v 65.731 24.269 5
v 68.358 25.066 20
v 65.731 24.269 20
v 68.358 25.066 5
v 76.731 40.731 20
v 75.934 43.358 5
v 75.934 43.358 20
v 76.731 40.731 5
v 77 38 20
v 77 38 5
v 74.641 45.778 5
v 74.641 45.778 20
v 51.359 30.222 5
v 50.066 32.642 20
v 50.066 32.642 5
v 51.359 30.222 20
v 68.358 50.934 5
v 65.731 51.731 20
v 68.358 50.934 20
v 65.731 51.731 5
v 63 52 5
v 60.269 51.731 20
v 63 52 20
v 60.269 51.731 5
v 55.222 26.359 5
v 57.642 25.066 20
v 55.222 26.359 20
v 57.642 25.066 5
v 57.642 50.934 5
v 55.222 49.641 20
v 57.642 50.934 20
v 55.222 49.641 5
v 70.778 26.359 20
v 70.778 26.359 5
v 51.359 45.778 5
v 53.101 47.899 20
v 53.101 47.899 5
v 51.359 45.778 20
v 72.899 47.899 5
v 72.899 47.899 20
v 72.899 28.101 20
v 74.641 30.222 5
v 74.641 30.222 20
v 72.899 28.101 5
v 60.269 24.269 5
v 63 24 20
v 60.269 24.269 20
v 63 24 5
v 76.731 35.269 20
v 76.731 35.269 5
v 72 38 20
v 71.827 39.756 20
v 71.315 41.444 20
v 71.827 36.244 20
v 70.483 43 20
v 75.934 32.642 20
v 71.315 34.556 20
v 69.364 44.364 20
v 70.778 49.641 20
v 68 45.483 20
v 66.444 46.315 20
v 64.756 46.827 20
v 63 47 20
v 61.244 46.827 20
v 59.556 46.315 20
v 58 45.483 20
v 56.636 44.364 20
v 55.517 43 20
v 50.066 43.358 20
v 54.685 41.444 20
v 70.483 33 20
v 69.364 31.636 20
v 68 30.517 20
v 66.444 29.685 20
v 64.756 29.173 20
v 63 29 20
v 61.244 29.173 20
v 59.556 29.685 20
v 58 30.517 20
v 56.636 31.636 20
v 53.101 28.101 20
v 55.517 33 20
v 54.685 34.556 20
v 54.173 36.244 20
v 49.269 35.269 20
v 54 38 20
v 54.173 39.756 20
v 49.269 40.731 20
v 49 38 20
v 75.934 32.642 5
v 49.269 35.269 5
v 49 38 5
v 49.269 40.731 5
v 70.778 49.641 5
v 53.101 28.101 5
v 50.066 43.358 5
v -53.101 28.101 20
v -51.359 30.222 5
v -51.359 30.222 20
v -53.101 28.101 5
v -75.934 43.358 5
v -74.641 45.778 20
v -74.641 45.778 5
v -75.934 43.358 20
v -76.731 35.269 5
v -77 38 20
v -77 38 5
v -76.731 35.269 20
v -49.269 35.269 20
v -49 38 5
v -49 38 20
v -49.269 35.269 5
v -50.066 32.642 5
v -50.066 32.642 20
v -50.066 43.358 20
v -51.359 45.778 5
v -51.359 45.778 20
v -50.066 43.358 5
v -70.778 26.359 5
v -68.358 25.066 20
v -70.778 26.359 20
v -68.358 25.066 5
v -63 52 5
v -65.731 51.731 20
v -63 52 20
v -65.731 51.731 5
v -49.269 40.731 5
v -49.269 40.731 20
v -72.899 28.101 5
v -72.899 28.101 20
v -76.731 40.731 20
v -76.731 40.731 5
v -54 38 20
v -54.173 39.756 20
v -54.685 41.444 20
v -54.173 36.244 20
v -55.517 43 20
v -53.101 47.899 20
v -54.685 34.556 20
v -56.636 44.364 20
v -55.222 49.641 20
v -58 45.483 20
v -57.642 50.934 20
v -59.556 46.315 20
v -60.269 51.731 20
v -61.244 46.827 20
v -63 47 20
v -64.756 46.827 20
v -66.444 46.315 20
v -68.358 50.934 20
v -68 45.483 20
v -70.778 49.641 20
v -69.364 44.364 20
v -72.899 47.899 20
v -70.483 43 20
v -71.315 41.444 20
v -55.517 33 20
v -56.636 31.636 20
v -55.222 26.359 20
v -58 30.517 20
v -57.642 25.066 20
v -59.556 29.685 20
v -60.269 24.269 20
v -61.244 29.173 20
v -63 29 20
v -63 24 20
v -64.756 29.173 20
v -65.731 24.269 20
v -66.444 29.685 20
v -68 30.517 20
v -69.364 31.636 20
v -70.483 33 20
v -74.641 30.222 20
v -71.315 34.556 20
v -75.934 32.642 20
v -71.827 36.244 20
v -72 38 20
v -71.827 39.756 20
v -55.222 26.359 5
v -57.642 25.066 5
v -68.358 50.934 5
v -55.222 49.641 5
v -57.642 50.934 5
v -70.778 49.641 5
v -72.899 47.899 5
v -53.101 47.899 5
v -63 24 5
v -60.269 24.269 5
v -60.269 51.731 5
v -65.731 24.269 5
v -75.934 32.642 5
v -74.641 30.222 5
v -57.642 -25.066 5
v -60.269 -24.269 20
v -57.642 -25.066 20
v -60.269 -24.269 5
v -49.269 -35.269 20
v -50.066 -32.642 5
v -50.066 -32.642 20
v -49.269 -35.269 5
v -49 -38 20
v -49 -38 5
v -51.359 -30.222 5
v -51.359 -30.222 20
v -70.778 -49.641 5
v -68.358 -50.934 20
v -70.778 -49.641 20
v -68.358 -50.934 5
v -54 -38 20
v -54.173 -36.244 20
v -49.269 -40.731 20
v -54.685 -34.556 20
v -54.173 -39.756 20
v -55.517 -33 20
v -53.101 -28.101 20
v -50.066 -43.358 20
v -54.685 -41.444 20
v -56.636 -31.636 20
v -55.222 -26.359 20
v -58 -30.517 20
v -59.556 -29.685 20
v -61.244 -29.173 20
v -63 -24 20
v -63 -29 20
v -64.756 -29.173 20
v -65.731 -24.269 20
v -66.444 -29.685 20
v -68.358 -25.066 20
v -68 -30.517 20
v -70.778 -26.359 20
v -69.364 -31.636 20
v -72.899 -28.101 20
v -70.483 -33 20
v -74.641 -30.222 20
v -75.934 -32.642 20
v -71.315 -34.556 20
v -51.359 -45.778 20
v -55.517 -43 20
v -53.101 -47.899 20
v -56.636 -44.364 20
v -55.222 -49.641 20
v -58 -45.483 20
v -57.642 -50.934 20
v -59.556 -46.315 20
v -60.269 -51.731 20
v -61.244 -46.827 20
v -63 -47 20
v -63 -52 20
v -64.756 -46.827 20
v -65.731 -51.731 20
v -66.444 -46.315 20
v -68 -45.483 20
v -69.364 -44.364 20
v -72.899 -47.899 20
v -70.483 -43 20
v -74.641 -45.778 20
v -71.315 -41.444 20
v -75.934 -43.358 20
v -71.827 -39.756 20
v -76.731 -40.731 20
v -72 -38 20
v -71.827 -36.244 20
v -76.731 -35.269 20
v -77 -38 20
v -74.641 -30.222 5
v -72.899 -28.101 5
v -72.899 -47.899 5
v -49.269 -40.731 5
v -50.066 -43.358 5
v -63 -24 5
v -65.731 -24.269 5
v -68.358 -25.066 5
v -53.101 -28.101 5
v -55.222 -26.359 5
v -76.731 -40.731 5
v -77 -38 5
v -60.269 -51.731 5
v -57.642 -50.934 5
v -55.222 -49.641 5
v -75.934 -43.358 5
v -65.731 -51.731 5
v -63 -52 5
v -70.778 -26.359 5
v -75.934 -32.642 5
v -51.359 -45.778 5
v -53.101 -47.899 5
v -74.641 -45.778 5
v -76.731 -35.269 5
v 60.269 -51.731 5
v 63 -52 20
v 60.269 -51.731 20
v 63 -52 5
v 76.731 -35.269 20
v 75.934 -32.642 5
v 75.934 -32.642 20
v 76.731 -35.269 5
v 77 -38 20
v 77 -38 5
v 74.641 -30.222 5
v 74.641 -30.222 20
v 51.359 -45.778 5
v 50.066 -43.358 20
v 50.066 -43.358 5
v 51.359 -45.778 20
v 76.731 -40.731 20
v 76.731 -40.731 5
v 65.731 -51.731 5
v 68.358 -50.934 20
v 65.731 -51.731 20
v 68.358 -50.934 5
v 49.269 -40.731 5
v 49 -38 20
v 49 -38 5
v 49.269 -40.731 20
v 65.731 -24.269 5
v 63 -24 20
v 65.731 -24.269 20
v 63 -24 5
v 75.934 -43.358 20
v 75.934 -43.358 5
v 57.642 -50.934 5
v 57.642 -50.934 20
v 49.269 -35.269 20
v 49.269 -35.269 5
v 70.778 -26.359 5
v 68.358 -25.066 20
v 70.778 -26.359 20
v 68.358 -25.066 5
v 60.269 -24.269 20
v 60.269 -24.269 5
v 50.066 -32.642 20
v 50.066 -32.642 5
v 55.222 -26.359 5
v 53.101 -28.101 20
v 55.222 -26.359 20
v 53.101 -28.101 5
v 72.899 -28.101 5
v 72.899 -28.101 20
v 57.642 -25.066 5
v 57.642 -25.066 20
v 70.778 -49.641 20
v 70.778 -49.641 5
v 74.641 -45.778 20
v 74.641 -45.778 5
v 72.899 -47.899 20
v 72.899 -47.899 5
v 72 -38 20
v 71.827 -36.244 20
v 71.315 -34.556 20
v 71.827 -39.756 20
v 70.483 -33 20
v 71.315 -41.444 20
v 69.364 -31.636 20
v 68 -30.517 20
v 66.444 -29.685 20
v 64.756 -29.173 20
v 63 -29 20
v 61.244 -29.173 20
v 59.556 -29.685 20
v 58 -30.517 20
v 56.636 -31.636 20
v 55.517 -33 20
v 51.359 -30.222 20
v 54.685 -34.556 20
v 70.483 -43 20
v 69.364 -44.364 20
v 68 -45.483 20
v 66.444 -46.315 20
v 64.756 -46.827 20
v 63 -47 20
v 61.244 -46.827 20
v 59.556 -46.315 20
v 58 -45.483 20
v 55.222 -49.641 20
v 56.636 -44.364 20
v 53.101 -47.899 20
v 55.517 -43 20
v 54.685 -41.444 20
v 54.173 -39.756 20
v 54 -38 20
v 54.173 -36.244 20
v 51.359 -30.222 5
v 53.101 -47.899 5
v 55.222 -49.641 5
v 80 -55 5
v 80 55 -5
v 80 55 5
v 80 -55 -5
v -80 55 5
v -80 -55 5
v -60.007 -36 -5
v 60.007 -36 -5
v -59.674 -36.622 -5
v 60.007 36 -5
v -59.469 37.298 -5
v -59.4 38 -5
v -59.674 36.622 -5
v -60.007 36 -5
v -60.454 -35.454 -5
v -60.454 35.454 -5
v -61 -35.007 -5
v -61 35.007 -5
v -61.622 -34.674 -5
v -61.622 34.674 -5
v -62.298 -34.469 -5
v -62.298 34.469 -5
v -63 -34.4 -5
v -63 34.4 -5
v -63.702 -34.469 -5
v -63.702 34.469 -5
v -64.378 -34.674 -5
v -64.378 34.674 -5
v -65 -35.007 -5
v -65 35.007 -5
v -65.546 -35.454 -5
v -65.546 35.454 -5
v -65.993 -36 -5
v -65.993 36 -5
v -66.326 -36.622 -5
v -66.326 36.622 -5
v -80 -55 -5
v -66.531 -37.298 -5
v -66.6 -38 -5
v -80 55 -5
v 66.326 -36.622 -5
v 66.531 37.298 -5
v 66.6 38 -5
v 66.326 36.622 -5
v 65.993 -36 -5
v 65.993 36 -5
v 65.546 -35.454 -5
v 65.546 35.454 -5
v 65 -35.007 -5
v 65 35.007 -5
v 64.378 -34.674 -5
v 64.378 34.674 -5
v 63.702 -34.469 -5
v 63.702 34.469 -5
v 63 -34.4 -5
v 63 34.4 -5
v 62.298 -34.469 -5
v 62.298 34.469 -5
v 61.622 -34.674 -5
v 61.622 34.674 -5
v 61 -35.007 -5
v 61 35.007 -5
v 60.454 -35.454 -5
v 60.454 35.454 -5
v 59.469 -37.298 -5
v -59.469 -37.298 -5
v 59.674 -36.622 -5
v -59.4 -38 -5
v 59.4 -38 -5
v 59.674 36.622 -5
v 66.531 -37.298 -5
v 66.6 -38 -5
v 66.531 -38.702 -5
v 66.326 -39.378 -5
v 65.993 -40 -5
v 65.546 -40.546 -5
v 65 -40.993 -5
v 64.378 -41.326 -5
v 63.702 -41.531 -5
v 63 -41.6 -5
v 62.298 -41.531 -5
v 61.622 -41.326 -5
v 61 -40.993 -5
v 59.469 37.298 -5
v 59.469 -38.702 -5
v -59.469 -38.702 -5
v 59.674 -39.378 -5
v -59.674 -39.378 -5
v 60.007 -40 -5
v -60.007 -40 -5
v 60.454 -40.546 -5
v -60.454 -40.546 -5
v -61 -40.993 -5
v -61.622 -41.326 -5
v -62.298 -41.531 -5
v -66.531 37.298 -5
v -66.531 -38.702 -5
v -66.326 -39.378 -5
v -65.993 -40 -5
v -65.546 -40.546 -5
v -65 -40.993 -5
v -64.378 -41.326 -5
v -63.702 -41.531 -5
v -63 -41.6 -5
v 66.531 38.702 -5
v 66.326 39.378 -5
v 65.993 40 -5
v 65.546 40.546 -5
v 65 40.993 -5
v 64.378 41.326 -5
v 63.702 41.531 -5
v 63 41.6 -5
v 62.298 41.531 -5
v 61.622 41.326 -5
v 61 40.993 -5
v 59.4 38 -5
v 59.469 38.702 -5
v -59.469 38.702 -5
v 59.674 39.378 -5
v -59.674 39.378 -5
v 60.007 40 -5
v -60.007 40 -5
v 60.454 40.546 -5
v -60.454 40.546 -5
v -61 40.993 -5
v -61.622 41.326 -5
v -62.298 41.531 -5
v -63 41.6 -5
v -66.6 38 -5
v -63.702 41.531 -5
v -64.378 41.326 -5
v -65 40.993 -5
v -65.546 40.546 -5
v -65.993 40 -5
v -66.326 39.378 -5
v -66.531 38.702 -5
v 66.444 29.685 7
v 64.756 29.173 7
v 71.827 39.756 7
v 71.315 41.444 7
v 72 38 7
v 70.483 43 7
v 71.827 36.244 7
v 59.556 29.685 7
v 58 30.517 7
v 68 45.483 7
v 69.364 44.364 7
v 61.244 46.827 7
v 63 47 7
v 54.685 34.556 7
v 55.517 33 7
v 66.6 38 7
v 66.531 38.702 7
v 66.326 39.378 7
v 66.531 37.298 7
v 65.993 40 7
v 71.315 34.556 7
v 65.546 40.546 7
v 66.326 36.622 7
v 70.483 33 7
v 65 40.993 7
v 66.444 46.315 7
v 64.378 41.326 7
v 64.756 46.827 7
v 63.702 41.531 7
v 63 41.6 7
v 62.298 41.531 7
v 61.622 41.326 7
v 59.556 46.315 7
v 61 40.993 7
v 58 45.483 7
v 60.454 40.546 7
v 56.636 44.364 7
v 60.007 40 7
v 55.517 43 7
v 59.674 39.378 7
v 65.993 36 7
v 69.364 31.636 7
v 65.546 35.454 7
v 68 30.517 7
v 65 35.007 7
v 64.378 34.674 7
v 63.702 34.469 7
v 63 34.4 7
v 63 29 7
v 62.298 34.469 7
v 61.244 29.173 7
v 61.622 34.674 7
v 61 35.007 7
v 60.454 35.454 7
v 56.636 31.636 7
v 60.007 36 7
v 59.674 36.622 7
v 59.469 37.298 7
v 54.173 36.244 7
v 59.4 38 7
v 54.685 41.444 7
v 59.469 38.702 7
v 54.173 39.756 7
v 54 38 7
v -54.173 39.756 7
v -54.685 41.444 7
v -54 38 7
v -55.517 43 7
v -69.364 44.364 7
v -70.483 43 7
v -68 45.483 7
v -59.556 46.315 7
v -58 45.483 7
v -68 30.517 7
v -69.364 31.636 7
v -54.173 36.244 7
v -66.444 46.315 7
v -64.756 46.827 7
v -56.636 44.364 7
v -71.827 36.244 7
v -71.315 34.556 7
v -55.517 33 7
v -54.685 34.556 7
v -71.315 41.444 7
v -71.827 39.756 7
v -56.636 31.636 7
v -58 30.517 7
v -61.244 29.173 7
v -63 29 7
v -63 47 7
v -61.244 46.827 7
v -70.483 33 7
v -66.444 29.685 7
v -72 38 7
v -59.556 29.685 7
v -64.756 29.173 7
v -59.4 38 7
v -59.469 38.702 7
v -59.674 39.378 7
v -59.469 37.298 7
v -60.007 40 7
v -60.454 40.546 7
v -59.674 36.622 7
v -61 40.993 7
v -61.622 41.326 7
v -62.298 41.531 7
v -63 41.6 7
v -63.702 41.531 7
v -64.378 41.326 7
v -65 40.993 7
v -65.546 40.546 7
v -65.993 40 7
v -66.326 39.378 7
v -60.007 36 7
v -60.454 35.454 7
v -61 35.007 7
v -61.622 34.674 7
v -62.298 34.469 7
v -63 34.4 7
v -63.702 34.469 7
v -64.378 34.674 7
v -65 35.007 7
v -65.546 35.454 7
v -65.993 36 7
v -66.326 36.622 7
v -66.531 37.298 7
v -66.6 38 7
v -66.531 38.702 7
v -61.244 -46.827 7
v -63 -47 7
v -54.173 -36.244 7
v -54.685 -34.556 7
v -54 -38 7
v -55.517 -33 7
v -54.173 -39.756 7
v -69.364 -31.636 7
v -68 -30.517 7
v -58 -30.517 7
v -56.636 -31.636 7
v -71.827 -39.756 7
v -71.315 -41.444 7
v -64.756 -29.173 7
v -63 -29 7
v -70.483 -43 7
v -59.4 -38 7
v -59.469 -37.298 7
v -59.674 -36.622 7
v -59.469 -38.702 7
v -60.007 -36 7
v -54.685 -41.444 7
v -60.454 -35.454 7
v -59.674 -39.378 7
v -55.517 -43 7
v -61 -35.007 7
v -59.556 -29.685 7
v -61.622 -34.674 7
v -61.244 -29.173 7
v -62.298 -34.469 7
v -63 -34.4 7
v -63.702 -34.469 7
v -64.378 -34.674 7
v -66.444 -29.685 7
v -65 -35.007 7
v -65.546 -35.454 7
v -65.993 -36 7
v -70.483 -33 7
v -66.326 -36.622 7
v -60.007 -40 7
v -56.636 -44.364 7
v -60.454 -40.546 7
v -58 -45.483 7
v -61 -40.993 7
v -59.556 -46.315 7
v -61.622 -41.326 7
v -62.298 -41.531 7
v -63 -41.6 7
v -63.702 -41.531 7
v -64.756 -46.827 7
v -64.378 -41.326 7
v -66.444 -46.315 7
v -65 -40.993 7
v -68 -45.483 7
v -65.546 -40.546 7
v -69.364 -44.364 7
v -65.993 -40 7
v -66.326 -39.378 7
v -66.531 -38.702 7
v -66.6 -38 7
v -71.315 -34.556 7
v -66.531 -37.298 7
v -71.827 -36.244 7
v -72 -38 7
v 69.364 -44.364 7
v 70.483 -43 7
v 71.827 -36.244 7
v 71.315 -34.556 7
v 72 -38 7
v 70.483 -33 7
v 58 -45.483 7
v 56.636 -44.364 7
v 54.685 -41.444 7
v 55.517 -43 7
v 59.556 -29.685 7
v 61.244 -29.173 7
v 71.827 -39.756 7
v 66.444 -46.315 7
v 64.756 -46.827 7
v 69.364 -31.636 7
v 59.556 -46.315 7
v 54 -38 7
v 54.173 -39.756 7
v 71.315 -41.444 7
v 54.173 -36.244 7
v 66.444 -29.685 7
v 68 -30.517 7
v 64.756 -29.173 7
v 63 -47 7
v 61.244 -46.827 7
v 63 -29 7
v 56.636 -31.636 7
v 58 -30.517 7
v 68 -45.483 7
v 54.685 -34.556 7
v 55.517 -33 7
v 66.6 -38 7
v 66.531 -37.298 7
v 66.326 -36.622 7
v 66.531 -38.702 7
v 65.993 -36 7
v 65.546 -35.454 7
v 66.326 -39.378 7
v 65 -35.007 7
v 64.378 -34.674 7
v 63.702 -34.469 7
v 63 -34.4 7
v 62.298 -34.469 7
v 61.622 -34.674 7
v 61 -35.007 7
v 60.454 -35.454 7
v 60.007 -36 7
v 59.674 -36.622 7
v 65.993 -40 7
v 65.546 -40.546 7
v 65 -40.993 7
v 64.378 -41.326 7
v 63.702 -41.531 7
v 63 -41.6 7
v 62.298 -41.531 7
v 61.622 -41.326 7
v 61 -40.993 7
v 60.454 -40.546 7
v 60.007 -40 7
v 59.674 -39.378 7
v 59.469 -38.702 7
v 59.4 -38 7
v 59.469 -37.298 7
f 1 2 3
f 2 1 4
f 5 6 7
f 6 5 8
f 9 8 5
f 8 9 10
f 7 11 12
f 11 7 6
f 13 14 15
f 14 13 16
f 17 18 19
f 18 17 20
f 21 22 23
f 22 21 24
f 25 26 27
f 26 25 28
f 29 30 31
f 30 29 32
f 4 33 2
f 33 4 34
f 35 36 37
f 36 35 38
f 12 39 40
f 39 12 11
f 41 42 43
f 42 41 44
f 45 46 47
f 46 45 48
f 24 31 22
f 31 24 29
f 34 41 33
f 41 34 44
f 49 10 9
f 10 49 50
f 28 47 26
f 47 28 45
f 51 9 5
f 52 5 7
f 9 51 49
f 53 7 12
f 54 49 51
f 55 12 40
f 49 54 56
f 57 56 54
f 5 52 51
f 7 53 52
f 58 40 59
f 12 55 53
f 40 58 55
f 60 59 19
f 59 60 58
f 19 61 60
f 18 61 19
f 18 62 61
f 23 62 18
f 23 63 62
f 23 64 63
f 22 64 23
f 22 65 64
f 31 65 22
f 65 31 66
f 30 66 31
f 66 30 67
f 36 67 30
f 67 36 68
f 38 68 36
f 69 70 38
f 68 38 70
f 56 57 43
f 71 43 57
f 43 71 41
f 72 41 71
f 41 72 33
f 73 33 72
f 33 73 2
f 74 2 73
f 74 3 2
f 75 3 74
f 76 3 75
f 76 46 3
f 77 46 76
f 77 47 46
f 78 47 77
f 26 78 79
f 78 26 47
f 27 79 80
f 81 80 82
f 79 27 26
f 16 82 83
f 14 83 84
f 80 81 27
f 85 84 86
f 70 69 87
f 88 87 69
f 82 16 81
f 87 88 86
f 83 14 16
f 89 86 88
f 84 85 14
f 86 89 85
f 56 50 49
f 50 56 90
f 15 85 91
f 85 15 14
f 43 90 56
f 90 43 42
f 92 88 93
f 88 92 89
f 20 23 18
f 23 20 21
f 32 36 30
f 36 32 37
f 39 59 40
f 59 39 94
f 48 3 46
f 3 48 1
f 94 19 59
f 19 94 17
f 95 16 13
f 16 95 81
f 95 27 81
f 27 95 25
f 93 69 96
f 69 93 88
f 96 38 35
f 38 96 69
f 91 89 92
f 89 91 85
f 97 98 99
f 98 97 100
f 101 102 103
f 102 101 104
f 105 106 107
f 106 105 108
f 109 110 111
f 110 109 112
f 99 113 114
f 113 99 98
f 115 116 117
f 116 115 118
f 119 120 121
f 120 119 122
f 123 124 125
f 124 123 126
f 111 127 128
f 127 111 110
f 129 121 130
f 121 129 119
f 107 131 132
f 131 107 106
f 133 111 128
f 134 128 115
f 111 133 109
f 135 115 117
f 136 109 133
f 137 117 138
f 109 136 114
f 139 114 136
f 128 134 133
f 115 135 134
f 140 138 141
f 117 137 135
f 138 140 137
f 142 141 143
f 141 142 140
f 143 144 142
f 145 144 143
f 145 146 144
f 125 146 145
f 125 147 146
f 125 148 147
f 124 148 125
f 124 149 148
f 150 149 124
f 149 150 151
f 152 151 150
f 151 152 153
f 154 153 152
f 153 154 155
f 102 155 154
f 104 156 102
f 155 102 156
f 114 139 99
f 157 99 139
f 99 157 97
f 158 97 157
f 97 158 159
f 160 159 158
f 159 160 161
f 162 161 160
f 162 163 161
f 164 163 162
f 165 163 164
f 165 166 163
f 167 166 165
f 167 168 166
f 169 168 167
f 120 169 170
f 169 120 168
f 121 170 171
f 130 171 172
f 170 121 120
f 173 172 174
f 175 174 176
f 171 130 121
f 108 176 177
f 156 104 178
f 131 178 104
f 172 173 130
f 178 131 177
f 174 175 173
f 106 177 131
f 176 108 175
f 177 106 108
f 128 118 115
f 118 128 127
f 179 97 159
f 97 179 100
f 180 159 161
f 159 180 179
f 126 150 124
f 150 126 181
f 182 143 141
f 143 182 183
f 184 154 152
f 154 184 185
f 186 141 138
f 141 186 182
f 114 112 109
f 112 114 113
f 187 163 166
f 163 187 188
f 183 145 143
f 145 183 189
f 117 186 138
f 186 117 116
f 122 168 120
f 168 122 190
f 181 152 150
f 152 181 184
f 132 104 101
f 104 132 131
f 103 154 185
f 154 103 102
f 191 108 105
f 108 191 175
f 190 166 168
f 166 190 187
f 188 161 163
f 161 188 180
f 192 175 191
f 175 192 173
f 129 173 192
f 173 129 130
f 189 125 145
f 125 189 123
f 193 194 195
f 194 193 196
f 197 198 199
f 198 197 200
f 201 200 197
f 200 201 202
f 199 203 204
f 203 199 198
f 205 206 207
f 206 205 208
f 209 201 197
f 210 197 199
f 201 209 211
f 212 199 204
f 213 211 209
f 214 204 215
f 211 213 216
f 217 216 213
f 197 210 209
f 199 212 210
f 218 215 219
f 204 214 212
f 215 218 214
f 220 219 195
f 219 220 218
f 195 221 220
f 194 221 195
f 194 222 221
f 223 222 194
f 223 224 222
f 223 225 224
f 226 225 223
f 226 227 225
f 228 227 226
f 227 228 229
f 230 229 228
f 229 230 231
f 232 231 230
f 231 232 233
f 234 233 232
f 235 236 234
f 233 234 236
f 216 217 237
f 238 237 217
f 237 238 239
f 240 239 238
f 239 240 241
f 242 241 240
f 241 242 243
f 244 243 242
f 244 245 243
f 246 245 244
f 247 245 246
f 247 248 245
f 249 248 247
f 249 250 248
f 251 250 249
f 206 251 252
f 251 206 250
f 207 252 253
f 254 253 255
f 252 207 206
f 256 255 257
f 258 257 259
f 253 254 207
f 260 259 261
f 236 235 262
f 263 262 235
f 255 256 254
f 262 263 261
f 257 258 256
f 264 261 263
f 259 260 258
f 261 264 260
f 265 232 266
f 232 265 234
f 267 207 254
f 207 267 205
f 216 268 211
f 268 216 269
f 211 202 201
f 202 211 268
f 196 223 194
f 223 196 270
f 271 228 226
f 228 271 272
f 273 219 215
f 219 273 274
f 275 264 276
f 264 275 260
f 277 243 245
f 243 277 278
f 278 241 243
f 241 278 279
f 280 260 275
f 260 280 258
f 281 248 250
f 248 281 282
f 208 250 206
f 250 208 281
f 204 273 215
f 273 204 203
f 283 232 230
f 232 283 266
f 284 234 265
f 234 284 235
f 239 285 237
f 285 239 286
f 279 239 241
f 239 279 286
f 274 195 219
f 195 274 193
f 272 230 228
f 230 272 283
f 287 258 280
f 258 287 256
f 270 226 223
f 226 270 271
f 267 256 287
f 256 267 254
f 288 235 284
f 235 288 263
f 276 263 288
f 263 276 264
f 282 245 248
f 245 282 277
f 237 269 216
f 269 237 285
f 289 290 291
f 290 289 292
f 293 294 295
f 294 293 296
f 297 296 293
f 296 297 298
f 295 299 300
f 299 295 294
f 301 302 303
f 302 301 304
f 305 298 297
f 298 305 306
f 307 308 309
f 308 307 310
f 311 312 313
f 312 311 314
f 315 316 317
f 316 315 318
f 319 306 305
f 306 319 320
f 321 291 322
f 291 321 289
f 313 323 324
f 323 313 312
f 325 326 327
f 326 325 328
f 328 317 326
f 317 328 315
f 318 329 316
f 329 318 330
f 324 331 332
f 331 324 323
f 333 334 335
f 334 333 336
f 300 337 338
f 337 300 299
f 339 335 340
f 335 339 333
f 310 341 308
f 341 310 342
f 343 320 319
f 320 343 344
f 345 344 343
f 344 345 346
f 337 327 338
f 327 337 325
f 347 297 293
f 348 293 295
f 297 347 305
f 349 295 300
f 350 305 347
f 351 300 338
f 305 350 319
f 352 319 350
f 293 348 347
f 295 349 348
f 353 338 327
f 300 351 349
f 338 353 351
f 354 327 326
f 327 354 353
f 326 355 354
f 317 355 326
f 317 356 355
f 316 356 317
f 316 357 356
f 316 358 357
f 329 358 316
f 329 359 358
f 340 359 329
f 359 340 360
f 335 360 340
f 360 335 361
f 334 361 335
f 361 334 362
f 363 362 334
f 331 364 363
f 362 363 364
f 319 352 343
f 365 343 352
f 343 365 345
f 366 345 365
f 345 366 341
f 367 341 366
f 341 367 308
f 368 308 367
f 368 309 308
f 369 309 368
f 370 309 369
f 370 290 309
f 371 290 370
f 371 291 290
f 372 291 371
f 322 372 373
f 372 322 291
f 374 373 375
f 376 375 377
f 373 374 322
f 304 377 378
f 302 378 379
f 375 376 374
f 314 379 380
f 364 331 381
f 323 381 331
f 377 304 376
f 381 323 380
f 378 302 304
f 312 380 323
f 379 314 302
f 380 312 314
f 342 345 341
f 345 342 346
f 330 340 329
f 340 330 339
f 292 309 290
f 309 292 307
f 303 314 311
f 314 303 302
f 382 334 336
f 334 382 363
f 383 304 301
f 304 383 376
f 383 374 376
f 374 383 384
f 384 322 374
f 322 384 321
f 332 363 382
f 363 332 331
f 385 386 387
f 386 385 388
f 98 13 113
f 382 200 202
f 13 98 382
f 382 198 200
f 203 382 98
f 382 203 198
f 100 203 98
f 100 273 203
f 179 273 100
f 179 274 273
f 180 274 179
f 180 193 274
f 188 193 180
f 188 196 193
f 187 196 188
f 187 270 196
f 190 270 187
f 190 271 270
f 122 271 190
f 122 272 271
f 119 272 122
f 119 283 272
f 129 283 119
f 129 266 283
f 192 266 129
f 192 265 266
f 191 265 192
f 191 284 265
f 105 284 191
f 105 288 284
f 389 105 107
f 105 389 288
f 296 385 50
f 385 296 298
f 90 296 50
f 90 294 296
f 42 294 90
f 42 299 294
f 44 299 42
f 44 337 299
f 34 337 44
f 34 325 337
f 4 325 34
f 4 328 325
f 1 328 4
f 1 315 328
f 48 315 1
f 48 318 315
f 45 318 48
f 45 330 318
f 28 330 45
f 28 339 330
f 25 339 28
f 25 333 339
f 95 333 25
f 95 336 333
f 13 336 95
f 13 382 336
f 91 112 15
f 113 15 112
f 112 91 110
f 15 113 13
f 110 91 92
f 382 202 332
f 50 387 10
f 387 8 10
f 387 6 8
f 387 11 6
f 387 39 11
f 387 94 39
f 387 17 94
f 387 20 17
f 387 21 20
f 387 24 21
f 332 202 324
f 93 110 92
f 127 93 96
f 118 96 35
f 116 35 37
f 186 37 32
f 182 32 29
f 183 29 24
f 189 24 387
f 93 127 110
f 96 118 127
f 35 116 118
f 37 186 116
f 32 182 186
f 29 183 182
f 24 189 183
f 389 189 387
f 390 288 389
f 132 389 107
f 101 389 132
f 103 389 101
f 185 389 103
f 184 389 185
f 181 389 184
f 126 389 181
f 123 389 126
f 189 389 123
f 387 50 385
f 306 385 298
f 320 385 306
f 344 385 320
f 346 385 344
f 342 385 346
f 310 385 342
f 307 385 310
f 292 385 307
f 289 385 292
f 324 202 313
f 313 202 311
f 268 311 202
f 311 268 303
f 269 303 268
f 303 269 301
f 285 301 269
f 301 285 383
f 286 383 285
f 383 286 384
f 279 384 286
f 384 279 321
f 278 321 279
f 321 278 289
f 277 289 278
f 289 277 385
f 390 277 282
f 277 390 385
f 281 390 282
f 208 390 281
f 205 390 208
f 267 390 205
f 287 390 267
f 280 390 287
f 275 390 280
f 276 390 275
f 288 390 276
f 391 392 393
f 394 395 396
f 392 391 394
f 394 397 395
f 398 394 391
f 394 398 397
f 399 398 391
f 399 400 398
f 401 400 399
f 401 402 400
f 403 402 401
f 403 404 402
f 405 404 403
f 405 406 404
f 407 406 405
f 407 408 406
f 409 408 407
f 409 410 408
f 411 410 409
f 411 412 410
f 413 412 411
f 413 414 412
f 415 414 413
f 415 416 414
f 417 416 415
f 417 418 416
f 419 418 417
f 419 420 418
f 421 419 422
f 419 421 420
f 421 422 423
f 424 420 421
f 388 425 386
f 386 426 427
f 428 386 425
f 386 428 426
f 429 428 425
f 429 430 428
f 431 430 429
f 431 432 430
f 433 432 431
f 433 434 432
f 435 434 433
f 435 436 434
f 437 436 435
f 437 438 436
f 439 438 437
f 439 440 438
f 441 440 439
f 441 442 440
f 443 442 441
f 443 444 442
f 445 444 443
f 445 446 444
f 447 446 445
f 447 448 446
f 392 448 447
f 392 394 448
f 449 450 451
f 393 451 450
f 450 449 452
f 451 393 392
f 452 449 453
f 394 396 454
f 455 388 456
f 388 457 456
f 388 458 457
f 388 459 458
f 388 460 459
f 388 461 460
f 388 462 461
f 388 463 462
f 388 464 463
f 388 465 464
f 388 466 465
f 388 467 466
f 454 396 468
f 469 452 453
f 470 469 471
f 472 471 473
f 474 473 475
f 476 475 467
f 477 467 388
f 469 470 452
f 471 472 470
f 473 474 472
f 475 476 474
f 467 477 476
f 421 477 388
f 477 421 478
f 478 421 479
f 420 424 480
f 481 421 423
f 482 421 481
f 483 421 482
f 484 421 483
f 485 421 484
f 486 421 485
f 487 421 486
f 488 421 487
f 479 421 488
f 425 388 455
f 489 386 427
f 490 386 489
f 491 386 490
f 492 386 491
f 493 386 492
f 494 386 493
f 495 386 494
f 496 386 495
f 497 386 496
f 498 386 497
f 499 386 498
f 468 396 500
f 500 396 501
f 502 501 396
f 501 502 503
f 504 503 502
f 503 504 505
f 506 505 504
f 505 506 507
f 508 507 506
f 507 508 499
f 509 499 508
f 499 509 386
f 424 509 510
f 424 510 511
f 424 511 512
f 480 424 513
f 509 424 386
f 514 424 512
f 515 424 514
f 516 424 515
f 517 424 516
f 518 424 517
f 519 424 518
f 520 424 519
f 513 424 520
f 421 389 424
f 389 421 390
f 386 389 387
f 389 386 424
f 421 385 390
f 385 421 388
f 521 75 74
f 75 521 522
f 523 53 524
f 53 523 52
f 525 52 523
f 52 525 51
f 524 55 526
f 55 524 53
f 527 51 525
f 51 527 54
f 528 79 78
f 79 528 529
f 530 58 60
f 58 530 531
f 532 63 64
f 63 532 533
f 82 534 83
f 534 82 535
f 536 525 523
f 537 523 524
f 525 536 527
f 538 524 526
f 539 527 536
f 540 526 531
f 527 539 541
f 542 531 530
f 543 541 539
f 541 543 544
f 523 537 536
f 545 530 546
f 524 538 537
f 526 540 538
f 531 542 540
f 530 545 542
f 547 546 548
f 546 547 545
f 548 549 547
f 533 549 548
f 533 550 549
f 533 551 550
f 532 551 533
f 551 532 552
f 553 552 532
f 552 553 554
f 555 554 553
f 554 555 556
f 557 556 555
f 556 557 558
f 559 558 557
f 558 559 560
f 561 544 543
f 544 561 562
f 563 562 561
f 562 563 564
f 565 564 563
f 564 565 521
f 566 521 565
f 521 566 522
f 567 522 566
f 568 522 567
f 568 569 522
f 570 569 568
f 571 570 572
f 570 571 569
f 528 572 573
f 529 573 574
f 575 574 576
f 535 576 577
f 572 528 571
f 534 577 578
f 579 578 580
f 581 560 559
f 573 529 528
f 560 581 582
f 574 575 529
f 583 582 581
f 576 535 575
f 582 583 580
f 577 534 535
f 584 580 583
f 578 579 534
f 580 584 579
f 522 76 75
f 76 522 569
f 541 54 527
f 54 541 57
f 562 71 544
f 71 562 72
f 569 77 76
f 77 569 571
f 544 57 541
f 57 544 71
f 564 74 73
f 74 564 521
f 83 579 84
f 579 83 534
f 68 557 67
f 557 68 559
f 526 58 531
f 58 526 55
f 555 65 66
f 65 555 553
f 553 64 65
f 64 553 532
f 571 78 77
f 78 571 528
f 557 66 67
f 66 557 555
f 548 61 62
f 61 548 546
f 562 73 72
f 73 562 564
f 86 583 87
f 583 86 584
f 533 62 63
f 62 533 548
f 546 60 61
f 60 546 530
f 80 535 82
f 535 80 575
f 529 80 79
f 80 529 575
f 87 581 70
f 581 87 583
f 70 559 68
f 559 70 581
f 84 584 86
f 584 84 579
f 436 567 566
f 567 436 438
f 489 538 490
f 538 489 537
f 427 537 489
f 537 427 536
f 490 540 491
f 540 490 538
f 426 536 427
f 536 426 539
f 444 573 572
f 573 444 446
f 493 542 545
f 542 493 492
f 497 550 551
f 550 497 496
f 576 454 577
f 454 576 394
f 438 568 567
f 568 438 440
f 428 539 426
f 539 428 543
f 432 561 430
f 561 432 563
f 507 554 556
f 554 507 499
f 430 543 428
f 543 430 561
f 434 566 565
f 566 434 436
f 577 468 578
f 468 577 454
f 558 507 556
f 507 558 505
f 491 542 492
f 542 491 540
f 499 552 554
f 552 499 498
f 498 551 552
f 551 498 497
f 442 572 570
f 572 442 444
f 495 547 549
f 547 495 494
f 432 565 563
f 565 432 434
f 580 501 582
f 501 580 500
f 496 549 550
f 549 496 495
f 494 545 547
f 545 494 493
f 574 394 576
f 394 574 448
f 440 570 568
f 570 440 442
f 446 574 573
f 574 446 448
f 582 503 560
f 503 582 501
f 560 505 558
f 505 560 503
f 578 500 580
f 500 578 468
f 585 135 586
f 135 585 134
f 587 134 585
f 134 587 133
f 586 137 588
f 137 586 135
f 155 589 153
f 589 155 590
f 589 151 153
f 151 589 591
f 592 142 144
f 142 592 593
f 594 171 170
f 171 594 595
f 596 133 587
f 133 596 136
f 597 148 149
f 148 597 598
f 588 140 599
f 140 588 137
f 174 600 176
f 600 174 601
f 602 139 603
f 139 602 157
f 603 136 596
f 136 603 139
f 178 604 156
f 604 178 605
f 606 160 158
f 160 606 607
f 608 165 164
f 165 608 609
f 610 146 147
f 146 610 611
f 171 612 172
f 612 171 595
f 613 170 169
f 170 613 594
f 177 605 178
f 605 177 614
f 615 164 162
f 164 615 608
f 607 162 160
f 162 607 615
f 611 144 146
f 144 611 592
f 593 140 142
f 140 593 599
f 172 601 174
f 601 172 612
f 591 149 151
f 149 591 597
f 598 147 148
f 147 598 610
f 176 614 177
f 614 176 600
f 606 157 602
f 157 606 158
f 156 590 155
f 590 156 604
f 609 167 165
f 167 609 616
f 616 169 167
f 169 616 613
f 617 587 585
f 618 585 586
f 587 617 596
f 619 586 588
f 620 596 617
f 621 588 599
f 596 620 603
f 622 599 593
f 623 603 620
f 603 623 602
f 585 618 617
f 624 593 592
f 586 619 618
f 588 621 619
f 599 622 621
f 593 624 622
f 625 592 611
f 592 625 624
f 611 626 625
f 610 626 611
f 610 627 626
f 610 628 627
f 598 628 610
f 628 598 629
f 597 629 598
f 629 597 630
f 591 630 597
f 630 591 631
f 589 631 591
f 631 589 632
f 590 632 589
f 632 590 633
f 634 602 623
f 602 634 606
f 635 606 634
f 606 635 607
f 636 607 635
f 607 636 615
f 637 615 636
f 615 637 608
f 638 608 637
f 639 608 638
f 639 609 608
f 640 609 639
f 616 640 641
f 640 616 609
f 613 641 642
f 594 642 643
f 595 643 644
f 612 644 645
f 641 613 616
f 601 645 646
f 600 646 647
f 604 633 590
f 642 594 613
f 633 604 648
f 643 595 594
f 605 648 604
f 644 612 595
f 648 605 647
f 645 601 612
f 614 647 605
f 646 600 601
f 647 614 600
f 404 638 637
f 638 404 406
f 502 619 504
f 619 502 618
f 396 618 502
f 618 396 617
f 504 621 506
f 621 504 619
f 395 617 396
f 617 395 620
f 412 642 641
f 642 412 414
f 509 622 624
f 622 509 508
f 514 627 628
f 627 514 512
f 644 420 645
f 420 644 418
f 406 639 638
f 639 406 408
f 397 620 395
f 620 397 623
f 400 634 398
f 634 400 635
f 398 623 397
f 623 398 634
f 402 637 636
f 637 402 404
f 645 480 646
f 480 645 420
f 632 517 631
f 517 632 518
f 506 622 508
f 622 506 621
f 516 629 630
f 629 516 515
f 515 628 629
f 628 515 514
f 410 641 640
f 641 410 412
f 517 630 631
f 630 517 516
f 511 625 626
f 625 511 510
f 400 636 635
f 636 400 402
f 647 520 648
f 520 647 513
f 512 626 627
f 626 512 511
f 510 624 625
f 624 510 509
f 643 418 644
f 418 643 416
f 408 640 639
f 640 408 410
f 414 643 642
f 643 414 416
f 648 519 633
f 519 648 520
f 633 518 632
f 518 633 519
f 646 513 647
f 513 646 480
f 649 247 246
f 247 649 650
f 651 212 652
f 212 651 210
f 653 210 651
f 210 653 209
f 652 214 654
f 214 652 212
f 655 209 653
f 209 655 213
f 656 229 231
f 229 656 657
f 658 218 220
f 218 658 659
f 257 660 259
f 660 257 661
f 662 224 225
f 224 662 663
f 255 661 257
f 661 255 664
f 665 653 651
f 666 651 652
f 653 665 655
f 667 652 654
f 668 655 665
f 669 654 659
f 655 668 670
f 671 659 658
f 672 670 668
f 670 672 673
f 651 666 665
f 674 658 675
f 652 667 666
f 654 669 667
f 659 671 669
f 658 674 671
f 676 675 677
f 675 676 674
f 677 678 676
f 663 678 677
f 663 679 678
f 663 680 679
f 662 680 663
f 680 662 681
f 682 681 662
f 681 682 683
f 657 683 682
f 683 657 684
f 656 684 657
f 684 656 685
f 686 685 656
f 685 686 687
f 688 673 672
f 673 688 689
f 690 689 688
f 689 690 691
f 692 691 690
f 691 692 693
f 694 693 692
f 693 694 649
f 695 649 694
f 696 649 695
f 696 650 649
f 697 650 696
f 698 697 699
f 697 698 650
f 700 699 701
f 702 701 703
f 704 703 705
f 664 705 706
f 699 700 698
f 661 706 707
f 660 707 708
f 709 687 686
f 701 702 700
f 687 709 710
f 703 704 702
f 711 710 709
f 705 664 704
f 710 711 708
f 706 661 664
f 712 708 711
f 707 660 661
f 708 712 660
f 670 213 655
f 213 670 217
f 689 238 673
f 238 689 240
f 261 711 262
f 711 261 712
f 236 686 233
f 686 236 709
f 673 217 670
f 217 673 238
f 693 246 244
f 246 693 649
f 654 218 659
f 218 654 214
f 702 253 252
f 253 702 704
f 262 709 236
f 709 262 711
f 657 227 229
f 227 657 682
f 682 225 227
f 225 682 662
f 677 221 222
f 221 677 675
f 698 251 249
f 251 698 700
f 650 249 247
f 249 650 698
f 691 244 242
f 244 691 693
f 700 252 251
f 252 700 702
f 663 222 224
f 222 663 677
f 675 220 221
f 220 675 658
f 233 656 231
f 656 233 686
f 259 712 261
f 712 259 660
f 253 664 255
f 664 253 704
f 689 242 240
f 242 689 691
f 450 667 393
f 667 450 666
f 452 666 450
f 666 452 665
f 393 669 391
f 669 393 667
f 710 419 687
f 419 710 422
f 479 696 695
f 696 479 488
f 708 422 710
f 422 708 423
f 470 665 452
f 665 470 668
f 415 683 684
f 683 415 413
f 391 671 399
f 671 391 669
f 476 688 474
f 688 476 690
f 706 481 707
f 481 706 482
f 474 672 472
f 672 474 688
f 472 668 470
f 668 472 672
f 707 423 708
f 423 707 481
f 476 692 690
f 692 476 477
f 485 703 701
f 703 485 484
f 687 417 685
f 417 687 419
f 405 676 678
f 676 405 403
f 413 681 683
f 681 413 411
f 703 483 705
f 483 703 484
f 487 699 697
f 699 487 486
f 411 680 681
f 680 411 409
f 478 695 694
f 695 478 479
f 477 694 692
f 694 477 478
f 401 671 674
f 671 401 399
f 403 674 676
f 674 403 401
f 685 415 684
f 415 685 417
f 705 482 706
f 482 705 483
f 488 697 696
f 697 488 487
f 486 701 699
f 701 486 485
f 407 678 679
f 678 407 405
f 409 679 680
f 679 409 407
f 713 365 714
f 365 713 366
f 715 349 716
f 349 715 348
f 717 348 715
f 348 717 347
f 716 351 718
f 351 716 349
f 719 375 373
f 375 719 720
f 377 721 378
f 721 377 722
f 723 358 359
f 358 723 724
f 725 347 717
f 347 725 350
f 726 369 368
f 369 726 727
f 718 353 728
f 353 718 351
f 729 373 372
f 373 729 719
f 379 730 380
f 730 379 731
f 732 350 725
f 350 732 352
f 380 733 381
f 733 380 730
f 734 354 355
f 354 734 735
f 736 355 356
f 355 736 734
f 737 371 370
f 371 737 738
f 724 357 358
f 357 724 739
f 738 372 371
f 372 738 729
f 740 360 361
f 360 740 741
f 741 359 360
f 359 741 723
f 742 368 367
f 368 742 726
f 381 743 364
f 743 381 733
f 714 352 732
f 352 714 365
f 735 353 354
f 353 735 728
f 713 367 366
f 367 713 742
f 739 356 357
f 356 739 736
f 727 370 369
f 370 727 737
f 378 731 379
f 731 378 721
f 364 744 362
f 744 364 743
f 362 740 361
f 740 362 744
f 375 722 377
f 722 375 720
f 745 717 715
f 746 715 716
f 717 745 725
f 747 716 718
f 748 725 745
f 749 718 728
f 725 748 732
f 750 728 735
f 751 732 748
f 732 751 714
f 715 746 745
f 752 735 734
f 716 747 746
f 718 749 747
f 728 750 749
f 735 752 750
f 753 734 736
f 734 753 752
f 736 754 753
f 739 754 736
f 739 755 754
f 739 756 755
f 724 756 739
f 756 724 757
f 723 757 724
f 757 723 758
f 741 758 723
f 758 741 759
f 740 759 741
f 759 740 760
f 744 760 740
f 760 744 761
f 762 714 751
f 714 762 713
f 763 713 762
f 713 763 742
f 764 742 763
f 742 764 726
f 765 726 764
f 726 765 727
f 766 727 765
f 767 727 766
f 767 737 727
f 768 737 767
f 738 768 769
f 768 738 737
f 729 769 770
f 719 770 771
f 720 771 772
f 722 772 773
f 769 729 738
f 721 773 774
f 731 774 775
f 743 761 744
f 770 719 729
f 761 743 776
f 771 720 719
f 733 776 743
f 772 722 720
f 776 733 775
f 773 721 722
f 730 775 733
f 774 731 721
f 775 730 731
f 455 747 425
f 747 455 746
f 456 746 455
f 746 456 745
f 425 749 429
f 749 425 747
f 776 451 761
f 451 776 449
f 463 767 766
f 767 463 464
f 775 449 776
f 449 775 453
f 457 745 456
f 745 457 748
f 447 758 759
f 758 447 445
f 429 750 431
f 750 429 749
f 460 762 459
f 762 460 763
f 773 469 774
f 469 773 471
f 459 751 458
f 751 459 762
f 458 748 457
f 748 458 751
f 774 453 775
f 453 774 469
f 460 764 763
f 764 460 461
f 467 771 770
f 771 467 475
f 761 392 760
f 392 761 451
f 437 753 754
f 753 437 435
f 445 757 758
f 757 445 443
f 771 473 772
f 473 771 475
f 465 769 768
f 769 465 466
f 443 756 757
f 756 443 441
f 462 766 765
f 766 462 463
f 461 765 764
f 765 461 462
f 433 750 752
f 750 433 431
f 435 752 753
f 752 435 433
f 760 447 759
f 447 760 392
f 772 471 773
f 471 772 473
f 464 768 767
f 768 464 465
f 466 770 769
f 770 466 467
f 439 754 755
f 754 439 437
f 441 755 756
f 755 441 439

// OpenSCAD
$fn = 32;

// ----------------------------------------------------------------------
// Socket pad plate
// bosses with counterbored sockets for the screws
// ----------------------------------------------------------------------

// --- parameters (mm) ---
base_t = 10;             // base plate thickness
boss_h = 15;             // boss height above the base plate
boss_d = 28;             // boss diameter
socket_d = 18;           // socket diameter
socket_depth = 13;       // socket depth from the boss face
bolt_d = 7.2;            // screw clearance hole through the socket floor
plate = [160, 110, 10];  // overall size (x, y, z)
edge = 17;               // boss centre offset from the plate edge
pads = 4;                // boss count, one per corner

// --- derived feature positions (mm) ---
height = base_t + boss_h;        // = 25   overall height of the part
corner_x = plate[0] / 2 - edge;  // = 63   boss centre X
corner_y = plate[1] / 2 - edge;  // = 38   boss centre Y
feature_centers = [
  [corner_x, corner_y],
  [-corner_x, corner_y],
  [-corner_x, -corner_y],
  [corner_x, -corner_y]
];   // boss centres: sockets, holes and the pads themselves are placed from here

// base plate, bosses on feature_centers, socket + through hole in each
difference() {
  union() {
    cube(plate, center = true);
    for (centre = feature_centers)
      translate([centre[0], centre[1], plate[2] / 2 - 1])
        cylinder(d = boss_d, h = boss_h + 1);
  }
  for (centre = feature_centers) {
    translate([centre[0], centre[1], plate[2] / 2 + boss_h - socket_depth])
      cylinder(d = socket_d, h = socket_depth + 1);
    translate([centre[0], centre[1], -height])
      cylinder(d = bolt_d, h = 2 * height + 2);  // through the socket floor
  }
}
